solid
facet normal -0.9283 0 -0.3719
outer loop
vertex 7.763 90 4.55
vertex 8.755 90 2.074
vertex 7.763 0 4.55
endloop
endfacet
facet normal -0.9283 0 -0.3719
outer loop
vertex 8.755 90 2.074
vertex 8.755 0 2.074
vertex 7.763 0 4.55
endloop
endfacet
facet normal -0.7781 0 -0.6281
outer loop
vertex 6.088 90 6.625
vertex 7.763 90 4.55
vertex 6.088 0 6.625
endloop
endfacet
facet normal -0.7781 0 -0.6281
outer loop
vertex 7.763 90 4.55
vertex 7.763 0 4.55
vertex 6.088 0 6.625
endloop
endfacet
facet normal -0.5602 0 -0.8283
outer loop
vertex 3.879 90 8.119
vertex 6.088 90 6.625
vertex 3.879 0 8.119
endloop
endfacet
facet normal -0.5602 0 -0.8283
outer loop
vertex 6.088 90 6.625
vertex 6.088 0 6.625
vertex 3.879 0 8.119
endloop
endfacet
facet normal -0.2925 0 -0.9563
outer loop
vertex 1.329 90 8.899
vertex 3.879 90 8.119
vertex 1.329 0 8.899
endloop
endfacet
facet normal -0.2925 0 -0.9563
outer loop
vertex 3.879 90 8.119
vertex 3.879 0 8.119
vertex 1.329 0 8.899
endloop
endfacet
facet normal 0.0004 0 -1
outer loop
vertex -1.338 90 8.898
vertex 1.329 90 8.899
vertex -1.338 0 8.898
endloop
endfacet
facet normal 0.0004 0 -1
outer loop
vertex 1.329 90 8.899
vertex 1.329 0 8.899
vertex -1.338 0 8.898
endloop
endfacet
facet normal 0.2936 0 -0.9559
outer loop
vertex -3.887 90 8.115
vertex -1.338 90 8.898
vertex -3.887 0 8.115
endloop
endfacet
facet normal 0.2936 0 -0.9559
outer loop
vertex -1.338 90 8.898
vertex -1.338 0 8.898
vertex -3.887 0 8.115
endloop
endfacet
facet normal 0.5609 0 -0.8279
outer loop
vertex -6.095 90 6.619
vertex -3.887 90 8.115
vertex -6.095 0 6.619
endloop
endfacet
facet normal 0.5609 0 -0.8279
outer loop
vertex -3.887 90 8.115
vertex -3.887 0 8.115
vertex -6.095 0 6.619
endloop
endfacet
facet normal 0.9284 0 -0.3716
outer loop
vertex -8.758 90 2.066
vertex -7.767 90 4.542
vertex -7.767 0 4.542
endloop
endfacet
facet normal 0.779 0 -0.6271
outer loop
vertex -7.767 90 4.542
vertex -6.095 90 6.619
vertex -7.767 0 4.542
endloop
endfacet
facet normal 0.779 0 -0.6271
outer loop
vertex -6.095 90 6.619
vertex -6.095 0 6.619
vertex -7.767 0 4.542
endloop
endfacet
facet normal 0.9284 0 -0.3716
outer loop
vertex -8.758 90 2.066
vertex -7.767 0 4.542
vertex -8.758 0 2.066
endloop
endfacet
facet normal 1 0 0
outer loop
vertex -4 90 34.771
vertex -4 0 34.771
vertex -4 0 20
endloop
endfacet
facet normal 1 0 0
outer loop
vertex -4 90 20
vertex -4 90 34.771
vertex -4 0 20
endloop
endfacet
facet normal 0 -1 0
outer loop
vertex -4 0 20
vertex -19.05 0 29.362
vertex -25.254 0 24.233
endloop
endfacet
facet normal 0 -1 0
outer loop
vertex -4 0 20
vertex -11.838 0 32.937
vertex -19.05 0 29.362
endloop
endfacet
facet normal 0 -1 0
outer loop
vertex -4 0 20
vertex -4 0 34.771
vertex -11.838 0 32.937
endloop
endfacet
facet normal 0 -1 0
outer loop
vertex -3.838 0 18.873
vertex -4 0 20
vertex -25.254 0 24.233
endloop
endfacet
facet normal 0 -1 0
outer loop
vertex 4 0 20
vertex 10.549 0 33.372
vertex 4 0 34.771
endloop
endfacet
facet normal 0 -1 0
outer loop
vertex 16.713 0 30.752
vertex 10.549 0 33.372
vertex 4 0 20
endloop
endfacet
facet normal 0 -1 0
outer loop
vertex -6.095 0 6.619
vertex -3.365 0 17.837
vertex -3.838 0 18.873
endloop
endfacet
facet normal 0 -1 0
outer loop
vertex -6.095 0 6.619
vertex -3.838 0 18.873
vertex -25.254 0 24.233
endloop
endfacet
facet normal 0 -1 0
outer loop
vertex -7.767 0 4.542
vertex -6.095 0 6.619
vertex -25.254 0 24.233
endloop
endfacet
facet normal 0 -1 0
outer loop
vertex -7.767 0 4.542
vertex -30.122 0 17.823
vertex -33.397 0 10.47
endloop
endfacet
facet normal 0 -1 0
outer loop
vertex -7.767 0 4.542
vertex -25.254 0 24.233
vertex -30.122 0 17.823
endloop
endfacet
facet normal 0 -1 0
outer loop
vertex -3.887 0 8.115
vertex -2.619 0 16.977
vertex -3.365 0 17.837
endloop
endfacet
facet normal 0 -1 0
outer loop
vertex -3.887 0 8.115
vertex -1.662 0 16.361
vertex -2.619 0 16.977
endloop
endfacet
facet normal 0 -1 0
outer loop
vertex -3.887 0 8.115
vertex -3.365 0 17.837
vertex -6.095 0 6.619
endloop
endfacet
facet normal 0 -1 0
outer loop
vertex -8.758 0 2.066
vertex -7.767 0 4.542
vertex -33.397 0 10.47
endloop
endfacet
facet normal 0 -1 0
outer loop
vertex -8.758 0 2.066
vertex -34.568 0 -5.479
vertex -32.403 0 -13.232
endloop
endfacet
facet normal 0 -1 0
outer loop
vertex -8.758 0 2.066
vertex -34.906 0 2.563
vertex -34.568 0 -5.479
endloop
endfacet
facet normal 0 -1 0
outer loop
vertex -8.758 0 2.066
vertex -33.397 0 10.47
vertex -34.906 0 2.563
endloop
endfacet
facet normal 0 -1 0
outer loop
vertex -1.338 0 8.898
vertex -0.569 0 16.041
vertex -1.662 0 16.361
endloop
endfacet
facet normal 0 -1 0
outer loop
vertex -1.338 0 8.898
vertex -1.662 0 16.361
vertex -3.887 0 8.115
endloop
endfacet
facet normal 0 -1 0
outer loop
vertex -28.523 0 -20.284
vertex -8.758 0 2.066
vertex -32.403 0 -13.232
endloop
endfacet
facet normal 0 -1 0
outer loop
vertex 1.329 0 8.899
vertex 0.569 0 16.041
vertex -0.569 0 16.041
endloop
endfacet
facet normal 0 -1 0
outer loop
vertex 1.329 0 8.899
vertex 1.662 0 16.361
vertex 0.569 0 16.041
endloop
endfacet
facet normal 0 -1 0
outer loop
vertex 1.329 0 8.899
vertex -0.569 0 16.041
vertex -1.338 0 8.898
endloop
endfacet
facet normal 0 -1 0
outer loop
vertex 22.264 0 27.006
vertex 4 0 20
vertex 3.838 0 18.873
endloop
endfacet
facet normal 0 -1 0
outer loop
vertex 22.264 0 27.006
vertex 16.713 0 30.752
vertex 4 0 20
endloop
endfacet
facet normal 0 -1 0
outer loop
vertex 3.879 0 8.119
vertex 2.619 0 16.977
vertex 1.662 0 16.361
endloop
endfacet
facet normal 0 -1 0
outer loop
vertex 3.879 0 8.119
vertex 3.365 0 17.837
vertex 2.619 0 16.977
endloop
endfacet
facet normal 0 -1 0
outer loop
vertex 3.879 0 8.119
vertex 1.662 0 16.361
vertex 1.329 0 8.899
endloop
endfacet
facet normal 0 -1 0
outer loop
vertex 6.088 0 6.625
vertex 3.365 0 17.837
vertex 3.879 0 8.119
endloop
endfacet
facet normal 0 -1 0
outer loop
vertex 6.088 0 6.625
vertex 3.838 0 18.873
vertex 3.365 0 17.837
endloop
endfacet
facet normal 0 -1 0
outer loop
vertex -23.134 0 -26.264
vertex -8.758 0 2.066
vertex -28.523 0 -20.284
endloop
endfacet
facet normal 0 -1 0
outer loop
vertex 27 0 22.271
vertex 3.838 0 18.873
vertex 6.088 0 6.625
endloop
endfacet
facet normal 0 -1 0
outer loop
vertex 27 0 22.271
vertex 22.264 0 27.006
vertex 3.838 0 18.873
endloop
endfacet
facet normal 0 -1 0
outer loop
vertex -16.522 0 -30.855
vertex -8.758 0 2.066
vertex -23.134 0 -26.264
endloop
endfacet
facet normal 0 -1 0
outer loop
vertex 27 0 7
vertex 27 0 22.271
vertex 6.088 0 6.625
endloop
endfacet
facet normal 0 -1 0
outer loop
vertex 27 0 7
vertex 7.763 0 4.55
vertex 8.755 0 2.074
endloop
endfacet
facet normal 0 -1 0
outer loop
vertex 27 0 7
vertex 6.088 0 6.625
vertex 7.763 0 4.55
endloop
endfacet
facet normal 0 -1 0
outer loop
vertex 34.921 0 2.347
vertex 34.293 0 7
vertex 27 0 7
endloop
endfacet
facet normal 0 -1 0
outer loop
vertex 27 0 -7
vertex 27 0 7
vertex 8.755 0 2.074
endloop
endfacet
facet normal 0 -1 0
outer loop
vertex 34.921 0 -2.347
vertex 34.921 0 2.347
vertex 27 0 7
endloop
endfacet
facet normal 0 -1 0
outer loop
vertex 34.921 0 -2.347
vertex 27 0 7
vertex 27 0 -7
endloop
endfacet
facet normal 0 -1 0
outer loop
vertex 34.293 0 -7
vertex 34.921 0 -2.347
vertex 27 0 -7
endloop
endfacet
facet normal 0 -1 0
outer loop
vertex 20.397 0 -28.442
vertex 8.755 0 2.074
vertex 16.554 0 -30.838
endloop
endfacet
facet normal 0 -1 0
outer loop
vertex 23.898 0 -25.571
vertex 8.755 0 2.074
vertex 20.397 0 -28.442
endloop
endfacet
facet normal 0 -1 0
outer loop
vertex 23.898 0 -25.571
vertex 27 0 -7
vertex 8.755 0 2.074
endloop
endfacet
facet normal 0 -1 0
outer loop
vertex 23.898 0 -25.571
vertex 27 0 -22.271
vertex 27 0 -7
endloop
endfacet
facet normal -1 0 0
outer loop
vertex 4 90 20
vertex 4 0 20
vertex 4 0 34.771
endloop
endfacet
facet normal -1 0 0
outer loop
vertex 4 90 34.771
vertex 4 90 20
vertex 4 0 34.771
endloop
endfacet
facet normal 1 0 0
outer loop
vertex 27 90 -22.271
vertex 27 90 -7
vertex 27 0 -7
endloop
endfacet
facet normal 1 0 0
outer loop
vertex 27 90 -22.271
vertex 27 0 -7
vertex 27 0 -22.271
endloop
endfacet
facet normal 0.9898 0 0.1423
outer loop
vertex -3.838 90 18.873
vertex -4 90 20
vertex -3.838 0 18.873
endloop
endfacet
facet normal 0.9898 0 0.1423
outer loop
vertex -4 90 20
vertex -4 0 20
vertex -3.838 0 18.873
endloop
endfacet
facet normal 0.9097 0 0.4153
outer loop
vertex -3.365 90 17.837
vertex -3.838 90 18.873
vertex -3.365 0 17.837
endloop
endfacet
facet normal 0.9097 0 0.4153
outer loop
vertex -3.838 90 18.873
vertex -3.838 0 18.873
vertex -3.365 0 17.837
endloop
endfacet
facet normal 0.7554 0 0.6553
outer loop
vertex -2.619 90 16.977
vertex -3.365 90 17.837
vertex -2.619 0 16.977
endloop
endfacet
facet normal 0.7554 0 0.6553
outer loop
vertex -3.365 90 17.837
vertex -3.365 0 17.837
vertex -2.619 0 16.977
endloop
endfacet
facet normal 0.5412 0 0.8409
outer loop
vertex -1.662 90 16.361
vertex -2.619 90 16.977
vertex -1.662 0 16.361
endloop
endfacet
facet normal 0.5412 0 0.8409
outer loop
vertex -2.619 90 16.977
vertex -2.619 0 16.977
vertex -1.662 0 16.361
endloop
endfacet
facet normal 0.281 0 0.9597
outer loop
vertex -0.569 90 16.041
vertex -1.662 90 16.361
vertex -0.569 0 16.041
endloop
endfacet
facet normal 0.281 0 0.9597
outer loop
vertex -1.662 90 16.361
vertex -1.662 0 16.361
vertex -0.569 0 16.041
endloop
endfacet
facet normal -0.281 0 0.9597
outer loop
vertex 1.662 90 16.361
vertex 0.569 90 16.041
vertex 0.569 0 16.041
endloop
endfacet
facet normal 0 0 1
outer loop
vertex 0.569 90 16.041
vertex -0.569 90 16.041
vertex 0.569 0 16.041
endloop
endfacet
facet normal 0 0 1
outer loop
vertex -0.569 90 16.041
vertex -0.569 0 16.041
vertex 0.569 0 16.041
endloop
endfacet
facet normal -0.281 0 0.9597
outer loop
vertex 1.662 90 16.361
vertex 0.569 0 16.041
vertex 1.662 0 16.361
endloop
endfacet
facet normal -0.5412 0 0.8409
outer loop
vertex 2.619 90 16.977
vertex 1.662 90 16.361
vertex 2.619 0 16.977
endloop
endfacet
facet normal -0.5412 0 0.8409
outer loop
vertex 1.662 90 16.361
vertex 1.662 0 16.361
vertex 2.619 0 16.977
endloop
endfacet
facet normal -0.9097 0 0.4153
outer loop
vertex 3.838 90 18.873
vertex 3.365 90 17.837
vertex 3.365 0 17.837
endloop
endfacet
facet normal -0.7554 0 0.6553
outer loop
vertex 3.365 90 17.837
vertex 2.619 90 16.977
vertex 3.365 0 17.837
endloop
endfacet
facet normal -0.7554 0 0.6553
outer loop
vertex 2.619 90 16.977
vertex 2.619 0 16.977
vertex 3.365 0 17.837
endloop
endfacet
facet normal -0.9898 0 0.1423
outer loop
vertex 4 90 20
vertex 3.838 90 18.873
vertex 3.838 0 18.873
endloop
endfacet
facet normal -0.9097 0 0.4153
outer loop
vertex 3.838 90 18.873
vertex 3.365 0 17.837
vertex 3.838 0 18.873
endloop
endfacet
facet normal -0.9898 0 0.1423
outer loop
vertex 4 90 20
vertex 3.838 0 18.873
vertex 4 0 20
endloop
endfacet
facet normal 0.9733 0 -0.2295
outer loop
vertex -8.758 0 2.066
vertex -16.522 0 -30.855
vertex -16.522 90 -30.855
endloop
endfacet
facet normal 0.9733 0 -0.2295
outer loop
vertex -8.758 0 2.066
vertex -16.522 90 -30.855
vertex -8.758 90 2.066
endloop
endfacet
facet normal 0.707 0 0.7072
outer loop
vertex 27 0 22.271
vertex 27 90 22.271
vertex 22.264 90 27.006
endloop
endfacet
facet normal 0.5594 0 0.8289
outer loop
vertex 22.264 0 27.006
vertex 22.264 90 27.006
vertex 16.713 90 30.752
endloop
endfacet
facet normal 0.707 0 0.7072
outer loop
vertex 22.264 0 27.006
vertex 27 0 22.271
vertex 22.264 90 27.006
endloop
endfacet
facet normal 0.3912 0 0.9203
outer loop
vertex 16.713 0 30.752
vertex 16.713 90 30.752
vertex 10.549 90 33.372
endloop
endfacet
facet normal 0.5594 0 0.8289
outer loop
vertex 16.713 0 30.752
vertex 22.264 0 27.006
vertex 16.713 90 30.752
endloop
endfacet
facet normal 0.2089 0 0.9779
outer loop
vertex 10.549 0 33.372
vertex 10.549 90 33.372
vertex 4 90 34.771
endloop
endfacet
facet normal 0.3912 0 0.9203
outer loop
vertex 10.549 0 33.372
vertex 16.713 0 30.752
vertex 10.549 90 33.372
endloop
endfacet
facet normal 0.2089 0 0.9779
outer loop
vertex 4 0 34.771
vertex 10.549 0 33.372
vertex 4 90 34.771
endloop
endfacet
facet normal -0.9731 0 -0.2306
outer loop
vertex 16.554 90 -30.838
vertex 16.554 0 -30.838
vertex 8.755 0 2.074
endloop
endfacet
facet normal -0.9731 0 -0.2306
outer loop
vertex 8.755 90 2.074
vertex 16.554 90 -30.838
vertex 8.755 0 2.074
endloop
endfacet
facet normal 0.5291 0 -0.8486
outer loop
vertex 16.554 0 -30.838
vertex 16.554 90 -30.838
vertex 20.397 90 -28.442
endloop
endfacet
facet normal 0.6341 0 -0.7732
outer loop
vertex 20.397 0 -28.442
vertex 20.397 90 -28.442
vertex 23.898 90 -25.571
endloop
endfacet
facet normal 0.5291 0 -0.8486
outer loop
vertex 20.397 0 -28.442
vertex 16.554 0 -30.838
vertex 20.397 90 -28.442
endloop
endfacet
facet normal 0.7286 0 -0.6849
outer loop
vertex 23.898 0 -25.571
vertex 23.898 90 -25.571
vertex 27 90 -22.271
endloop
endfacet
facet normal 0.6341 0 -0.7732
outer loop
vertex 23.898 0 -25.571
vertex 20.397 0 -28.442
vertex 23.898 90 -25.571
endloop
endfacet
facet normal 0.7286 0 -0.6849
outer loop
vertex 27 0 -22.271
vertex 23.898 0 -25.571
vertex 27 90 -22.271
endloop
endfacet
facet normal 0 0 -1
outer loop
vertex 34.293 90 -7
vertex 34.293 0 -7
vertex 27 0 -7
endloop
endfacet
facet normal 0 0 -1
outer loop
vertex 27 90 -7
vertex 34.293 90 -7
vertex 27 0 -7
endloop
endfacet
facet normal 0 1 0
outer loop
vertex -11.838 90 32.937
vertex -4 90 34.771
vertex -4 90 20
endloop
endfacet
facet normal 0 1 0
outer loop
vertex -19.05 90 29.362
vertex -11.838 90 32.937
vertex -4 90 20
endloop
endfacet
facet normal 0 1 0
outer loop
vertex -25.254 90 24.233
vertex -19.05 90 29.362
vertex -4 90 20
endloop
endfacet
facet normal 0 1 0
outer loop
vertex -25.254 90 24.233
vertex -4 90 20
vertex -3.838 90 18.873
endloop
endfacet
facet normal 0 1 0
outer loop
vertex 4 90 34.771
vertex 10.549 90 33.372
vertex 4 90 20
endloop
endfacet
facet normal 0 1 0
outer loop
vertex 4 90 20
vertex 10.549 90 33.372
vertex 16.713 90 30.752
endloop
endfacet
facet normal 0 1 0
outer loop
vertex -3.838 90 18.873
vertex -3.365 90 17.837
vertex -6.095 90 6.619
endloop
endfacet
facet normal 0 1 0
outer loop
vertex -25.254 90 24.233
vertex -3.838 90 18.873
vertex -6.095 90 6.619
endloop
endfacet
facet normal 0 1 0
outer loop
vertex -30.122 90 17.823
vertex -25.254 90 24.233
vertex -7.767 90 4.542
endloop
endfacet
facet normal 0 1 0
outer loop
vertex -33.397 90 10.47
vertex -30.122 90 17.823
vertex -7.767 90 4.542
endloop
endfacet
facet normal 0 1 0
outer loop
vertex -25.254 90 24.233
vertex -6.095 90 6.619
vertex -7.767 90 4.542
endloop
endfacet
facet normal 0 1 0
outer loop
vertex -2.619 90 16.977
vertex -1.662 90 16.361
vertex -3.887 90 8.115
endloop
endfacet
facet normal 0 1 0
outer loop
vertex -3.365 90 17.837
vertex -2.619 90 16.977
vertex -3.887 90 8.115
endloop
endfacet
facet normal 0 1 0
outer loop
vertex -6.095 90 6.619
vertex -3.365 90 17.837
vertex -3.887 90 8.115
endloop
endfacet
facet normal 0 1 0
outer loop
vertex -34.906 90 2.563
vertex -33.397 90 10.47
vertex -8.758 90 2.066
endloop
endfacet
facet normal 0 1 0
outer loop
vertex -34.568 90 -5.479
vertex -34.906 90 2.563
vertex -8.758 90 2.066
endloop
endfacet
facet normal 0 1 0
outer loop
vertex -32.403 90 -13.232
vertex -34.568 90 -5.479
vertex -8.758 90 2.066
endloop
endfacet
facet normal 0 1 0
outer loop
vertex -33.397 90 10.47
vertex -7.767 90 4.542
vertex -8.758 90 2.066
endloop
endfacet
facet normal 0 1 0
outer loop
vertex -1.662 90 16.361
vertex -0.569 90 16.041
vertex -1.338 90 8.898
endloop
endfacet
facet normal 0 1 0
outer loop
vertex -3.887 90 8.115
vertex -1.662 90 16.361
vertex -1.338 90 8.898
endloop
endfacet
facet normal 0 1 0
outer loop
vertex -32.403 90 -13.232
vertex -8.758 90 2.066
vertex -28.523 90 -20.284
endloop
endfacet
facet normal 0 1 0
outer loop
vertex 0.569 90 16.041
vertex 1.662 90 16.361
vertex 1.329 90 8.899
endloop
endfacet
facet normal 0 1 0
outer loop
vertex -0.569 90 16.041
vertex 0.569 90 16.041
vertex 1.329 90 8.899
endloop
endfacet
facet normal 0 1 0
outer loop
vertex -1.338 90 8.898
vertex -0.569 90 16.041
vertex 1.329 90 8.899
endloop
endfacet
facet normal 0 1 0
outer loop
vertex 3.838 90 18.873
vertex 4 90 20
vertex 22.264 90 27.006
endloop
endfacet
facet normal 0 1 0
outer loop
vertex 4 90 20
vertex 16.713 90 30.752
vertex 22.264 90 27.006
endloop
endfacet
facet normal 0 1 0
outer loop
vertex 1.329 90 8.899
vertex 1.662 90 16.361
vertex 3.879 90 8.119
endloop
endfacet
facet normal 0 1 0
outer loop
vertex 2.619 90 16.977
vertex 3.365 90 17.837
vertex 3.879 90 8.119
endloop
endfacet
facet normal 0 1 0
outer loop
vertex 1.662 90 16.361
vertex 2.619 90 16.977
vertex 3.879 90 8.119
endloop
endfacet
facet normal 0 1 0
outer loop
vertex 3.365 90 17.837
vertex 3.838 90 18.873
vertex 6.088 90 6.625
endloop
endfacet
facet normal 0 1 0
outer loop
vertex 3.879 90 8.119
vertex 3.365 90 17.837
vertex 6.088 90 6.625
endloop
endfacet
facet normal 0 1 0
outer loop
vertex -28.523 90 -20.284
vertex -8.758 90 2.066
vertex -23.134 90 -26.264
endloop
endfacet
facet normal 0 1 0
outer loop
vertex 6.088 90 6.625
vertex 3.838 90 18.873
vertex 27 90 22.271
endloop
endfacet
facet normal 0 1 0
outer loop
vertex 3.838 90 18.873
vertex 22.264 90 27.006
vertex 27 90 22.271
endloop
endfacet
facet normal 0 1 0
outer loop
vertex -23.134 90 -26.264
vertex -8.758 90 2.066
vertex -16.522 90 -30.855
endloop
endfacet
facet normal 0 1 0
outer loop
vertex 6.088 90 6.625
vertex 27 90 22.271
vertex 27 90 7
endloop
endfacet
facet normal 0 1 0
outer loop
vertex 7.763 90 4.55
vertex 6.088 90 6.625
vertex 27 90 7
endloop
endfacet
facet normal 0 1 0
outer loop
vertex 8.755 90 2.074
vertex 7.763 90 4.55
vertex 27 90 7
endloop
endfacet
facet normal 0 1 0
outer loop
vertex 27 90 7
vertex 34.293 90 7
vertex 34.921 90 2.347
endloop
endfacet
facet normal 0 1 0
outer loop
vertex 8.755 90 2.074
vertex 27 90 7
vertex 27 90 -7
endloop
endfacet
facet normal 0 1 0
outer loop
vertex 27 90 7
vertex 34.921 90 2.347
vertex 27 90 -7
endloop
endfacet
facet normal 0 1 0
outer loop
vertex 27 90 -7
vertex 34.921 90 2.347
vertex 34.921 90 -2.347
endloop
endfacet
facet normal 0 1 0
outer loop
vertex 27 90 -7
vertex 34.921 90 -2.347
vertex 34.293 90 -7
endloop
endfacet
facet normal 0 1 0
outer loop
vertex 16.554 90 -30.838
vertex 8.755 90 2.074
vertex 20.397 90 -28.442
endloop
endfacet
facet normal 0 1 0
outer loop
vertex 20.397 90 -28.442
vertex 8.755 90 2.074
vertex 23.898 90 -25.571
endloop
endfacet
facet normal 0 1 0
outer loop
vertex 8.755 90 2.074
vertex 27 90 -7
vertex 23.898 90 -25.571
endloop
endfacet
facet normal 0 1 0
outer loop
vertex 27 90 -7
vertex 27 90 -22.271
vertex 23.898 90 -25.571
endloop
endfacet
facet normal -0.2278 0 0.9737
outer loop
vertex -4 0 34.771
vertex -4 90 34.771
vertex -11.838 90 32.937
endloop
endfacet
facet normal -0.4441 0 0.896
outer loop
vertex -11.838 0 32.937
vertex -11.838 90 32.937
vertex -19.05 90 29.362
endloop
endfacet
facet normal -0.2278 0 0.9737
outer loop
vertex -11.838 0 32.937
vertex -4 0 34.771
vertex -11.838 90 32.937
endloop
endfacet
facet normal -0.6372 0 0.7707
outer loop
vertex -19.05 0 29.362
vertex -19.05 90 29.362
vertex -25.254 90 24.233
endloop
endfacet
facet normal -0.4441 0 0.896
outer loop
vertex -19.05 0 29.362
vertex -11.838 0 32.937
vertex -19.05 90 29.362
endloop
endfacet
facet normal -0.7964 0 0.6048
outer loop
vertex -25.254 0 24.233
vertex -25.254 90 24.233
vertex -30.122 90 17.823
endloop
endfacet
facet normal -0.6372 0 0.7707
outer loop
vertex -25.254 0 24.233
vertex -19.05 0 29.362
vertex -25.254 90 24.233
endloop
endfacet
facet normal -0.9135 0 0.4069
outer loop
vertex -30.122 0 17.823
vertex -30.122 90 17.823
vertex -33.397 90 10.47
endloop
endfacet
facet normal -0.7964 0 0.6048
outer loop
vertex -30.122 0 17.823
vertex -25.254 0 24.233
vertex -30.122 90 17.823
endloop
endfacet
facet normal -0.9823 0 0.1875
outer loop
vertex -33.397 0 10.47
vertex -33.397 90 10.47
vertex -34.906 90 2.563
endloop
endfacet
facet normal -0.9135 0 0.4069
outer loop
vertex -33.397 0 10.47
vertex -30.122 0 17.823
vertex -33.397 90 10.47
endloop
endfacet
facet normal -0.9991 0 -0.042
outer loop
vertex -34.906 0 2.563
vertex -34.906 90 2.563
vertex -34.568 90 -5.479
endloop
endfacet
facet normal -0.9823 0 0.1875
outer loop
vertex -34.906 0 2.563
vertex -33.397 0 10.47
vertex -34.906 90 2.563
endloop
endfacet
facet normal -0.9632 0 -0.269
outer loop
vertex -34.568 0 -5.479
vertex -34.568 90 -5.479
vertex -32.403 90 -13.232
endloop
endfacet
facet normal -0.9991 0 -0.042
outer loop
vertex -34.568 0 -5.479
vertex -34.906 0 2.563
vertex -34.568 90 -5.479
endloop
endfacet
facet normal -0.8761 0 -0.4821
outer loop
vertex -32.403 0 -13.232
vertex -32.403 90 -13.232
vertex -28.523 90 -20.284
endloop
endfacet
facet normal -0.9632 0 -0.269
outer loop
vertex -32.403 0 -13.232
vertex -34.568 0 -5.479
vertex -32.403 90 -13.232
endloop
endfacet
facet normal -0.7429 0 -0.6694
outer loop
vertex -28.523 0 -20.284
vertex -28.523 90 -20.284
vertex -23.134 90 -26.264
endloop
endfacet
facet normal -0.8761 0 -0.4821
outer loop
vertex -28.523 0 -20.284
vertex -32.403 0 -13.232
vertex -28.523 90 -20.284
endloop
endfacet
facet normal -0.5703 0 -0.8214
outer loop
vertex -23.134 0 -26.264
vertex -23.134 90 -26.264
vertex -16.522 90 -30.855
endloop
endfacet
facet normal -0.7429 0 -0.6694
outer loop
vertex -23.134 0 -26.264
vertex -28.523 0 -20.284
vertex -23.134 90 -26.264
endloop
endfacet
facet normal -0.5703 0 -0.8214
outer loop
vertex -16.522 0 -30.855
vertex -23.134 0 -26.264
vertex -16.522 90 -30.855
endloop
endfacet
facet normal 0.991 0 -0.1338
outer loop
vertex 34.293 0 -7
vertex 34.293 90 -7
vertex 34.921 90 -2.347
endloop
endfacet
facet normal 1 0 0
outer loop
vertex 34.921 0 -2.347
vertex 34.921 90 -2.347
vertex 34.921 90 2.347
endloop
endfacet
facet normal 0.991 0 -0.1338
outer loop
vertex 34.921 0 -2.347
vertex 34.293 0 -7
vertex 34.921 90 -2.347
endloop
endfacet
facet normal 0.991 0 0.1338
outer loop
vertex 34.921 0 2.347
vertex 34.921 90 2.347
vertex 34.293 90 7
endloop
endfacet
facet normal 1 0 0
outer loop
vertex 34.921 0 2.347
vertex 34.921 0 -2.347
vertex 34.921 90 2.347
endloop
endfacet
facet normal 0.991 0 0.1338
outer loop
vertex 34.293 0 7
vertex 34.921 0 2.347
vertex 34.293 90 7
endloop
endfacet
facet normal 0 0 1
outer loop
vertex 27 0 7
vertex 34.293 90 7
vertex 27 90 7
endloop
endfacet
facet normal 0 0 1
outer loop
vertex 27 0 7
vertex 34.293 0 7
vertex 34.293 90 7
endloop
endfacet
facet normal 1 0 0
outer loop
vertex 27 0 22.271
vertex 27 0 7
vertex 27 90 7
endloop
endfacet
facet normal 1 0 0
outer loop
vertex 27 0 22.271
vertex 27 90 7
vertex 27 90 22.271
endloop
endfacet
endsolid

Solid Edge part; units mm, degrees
sketch "Sketch1" plane through (0, 0, 0) normal (0, -1, 0) x (1, 0, 0)
  circle A0 centre (0, 0) radius 35
extrude "Protrusion1" add sketch "Sketch1" against normal blind 90
sketch "Sketch2" plane through (0, 0, 0) normal (0, -1, 0) x (1, 0, 0)
  line L0 (-4, 35) -> (-4, 20)
  line L1 (-4, 35) -> (4, 35)
  line L2 (4, 20) -> (4, 35)
  arc A0 (4, 20) -> (-4, 20) centre (0, 20) cw
extrude "ExtrudedCutout_1" cut sketch "Sketch2" against normal blind 90 and the other way blind 1
sketch "Sketch3" plane through (0, 0, -0.1147) normal (0, -1, 0) x (0, 0, -1)
  line L0 (6.8853, 34.2929) -> (6.8853, 27)
  line L1 (6.8853, 27) -> (22.1564, 27)
  arc A0 (22.1564, 27) -> (6.8853, 34.2929) centre (-0.1147, 0) ccw
  line L2 (-7.1147, 34.2929) -> (-7.1147, 27)
  line L3 (-7.1147, 27) -> (-22.3857, 27)
  arc A1 (-22.3857, 27) -> (-7.1147, 34.2929) centre (-0.1147, 0) cw
extrude "ExtrudedCutout_2" cut sketch "Sketch3" against normal blind 90 and the other way blind 1
sketch "Sketch4" plane through (0, 0, -0.1147) normal (0, -1, 0) x (1, 0, 0)
  line L0 (17.5402, -34.8853) -> (-17.5, -34.8853)
  line L1 (-17.5, -34.8853) -> (-8.7575, 2.1803)
  line L2 (17.5402, -34.8853) -> (8.7554, 2.1892)
  arc A0 (-8.7575, 2.1803) -> (8.7554, 2.1892) centre (0, 0.1147) cw
extrude "ExtrudedCutout_3" cut sketch "Sketch4" against normal blind 90 and the other way blind 1
